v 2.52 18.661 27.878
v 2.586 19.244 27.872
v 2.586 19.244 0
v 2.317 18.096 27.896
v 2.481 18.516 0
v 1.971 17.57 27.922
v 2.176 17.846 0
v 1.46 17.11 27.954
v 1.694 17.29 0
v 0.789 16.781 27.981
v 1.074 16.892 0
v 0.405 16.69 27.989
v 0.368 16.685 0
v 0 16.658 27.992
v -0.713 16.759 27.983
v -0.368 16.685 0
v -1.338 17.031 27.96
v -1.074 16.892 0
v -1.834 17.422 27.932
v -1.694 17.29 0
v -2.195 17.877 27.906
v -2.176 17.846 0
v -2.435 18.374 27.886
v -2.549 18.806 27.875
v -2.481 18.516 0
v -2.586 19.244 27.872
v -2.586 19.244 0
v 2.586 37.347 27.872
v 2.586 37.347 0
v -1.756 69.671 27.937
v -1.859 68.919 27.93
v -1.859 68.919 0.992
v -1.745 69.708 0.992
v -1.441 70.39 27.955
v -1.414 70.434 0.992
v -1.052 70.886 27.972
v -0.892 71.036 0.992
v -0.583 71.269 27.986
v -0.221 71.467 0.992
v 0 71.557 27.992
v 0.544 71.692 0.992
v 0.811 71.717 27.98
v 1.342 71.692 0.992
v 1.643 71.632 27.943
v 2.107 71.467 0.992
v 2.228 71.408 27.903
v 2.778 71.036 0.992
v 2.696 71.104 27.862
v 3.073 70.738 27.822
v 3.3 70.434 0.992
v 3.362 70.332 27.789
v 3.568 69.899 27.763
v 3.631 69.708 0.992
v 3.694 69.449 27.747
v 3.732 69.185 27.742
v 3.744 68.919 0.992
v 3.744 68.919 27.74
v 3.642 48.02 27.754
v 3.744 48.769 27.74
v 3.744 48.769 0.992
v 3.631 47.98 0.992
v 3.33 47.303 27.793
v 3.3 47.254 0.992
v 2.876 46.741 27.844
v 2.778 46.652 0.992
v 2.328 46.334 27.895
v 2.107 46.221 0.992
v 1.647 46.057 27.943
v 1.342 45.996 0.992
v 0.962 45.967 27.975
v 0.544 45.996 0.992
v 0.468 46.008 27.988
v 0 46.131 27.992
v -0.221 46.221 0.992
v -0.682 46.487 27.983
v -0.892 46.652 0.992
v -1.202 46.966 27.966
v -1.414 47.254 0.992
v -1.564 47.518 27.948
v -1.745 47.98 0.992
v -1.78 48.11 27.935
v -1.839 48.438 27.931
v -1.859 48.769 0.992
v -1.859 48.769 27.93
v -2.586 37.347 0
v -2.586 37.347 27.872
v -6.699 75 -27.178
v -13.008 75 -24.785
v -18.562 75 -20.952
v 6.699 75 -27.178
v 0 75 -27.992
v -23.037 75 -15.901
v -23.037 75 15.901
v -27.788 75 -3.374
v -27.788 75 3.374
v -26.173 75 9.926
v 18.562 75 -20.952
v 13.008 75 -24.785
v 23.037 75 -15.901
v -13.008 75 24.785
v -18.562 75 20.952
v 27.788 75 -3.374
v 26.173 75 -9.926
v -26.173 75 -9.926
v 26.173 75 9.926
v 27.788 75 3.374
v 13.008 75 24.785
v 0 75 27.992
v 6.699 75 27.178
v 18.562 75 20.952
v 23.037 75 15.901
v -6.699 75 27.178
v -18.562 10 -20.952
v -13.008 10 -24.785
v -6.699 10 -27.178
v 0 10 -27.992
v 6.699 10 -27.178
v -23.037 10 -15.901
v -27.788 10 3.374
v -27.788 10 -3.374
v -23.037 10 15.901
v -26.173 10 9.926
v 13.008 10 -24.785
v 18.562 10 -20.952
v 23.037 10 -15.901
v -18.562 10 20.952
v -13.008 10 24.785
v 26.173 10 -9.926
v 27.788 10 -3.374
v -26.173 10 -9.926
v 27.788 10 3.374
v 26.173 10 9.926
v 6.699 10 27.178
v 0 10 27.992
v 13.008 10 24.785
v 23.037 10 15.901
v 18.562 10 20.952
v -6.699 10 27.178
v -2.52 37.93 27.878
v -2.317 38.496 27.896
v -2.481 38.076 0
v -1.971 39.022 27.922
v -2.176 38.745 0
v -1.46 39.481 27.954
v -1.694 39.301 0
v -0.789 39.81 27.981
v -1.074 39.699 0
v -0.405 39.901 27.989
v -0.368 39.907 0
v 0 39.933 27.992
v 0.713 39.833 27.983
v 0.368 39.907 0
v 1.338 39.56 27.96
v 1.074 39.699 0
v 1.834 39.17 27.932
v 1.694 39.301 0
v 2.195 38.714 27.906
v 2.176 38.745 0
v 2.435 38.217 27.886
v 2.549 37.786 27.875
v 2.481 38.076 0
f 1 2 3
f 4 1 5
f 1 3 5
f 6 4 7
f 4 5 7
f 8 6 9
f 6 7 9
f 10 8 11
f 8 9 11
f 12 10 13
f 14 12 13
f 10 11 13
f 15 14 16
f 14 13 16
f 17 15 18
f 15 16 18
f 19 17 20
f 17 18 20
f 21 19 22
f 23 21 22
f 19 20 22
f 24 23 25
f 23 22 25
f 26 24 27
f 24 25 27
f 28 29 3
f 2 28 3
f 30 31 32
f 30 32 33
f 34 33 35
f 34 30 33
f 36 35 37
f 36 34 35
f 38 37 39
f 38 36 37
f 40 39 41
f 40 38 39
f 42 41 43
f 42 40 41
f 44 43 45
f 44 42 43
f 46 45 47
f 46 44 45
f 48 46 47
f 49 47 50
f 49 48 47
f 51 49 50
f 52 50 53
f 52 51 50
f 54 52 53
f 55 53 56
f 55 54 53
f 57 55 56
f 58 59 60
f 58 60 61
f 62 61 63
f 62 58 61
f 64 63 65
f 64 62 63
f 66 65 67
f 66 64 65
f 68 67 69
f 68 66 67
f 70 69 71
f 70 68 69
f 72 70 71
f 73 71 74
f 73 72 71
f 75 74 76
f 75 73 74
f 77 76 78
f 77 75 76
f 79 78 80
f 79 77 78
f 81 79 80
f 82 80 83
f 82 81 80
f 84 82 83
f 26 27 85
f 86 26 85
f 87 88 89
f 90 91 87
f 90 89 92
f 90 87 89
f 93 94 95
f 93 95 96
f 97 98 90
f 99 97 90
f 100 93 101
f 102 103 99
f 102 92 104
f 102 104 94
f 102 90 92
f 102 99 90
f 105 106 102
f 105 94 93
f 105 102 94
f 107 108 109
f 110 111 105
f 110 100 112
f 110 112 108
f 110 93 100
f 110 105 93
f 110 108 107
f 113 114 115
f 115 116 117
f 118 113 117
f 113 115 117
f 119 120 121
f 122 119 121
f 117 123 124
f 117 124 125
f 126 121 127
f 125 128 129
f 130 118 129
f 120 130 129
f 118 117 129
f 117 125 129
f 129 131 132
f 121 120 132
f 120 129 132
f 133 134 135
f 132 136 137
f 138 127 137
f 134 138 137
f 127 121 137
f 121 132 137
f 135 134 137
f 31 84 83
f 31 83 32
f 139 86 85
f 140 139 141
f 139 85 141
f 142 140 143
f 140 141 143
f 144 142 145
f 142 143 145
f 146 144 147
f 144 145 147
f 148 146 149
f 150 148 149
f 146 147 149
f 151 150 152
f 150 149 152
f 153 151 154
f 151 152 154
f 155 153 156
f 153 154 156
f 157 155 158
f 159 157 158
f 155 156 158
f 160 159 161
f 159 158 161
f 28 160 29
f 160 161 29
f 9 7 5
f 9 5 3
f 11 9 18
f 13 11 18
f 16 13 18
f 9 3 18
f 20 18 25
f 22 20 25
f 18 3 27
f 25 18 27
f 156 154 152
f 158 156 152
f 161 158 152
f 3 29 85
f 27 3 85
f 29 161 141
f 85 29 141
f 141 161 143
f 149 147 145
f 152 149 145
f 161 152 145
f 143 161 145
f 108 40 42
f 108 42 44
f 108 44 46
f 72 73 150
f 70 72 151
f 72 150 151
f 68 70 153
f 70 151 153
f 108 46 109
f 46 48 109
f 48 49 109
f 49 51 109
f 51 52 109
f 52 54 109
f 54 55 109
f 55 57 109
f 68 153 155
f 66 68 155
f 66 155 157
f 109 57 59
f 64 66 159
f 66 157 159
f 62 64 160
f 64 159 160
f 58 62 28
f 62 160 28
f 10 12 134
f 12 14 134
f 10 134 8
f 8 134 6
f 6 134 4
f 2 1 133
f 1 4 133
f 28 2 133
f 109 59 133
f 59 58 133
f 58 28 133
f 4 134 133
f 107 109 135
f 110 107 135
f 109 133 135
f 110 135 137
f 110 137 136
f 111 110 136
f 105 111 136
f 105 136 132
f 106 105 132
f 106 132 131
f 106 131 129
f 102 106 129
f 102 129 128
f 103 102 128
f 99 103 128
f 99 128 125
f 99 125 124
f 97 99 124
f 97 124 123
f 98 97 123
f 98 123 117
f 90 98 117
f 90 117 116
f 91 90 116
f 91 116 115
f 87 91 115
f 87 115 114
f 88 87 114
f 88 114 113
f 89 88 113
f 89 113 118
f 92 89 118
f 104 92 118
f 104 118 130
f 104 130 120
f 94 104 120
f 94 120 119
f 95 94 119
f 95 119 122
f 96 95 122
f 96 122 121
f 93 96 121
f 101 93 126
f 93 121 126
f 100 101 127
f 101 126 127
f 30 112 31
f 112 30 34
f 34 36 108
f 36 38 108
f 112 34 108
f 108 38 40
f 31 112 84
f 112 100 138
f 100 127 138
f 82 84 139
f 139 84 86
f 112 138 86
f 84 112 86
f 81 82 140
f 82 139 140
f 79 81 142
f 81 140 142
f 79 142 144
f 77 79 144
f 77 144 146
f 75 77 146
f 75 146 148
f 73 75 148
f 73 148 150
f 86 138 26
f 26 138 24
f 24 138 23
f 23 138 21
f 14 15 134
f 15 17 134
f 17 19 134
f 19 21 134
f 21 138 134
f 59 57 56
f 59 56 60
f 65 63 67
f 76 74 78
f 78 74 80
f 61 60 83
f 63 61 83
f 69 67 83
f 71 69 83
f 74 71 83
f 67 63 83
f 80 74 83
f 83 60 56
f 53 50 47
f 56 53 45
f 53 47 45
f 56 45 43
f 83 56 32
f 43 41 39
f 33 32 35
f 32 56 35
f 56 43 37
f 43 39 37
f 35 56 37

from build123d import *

# Parameters (mm, degrees)
SKETCH_3_R          = 27.991716744
EXTRUDE_1_DEPTH     = 65
CUT_EXTRUDE_1_DEPTH = 27
CUT_EXTRUDE_3_DEPTH = 50


with BuildPart() as part:
    # 草图3 → 凸台-拉伸1 (new body)
    with BuildSketch(Plane(origin=(0, 10, 0), x_dir=(1, 0, 0), z_dir=(0, 1, 0))):
        with Locations(Location((0, 0, 0), (0, 0, 270))):
            Circle(SKETCH_3_R)
    extrude(amount=EXTRUDE_1_DEPTH)

    # 草图4 → 切除-拉伸1 (cut)
    with BuildSketch(Plane.XY.offset(27.991716744)):
        with BuildLine():
            Line((3.744449093, 68.91896185), (3.744449093, 48.768976801))
            ThreePointArc((3.744449093, 48.768976801), (0.942846894, 45.967374602), (-1.858755305, 48.768976801))
            Line((-1.858755305, 48.768976801), (-1.858755305, 68.91896185))
            ThreePointArc((-1.858755305, 68.91896185), (0.942846894, 71.720564049), (3.744449093, 68.91896185))
        make_face()
    extrude(amount=-CUT_EXTRUDE_1_DEPTH, mode=Mode.SUBTRACT)

    # 草图6 → 切除-拉伸3 (cut)
    with BuildSketch(Plane.XY):
        with BuildLine():
            Line((2.586094338, 37.347060143), (2.586094338, 19.244399778))
            ThreePointArc((2.586094338, 19.244399778), (0, 16.658305441), (-2.586094338, 19.244399778))
            Line((-2.586094338, 19.244399778), (-2.586094338, 37.347060143))
            ThreePointArc((-2.586094338, 37.347060143), (0, 39.933154481), (2.586094338, 37.347060143))
        make_face()
    extrude(amount=CUT_EXTRUDE_3_DEPTH, mode=Mode.SUBTRACT)


solid = part.part
